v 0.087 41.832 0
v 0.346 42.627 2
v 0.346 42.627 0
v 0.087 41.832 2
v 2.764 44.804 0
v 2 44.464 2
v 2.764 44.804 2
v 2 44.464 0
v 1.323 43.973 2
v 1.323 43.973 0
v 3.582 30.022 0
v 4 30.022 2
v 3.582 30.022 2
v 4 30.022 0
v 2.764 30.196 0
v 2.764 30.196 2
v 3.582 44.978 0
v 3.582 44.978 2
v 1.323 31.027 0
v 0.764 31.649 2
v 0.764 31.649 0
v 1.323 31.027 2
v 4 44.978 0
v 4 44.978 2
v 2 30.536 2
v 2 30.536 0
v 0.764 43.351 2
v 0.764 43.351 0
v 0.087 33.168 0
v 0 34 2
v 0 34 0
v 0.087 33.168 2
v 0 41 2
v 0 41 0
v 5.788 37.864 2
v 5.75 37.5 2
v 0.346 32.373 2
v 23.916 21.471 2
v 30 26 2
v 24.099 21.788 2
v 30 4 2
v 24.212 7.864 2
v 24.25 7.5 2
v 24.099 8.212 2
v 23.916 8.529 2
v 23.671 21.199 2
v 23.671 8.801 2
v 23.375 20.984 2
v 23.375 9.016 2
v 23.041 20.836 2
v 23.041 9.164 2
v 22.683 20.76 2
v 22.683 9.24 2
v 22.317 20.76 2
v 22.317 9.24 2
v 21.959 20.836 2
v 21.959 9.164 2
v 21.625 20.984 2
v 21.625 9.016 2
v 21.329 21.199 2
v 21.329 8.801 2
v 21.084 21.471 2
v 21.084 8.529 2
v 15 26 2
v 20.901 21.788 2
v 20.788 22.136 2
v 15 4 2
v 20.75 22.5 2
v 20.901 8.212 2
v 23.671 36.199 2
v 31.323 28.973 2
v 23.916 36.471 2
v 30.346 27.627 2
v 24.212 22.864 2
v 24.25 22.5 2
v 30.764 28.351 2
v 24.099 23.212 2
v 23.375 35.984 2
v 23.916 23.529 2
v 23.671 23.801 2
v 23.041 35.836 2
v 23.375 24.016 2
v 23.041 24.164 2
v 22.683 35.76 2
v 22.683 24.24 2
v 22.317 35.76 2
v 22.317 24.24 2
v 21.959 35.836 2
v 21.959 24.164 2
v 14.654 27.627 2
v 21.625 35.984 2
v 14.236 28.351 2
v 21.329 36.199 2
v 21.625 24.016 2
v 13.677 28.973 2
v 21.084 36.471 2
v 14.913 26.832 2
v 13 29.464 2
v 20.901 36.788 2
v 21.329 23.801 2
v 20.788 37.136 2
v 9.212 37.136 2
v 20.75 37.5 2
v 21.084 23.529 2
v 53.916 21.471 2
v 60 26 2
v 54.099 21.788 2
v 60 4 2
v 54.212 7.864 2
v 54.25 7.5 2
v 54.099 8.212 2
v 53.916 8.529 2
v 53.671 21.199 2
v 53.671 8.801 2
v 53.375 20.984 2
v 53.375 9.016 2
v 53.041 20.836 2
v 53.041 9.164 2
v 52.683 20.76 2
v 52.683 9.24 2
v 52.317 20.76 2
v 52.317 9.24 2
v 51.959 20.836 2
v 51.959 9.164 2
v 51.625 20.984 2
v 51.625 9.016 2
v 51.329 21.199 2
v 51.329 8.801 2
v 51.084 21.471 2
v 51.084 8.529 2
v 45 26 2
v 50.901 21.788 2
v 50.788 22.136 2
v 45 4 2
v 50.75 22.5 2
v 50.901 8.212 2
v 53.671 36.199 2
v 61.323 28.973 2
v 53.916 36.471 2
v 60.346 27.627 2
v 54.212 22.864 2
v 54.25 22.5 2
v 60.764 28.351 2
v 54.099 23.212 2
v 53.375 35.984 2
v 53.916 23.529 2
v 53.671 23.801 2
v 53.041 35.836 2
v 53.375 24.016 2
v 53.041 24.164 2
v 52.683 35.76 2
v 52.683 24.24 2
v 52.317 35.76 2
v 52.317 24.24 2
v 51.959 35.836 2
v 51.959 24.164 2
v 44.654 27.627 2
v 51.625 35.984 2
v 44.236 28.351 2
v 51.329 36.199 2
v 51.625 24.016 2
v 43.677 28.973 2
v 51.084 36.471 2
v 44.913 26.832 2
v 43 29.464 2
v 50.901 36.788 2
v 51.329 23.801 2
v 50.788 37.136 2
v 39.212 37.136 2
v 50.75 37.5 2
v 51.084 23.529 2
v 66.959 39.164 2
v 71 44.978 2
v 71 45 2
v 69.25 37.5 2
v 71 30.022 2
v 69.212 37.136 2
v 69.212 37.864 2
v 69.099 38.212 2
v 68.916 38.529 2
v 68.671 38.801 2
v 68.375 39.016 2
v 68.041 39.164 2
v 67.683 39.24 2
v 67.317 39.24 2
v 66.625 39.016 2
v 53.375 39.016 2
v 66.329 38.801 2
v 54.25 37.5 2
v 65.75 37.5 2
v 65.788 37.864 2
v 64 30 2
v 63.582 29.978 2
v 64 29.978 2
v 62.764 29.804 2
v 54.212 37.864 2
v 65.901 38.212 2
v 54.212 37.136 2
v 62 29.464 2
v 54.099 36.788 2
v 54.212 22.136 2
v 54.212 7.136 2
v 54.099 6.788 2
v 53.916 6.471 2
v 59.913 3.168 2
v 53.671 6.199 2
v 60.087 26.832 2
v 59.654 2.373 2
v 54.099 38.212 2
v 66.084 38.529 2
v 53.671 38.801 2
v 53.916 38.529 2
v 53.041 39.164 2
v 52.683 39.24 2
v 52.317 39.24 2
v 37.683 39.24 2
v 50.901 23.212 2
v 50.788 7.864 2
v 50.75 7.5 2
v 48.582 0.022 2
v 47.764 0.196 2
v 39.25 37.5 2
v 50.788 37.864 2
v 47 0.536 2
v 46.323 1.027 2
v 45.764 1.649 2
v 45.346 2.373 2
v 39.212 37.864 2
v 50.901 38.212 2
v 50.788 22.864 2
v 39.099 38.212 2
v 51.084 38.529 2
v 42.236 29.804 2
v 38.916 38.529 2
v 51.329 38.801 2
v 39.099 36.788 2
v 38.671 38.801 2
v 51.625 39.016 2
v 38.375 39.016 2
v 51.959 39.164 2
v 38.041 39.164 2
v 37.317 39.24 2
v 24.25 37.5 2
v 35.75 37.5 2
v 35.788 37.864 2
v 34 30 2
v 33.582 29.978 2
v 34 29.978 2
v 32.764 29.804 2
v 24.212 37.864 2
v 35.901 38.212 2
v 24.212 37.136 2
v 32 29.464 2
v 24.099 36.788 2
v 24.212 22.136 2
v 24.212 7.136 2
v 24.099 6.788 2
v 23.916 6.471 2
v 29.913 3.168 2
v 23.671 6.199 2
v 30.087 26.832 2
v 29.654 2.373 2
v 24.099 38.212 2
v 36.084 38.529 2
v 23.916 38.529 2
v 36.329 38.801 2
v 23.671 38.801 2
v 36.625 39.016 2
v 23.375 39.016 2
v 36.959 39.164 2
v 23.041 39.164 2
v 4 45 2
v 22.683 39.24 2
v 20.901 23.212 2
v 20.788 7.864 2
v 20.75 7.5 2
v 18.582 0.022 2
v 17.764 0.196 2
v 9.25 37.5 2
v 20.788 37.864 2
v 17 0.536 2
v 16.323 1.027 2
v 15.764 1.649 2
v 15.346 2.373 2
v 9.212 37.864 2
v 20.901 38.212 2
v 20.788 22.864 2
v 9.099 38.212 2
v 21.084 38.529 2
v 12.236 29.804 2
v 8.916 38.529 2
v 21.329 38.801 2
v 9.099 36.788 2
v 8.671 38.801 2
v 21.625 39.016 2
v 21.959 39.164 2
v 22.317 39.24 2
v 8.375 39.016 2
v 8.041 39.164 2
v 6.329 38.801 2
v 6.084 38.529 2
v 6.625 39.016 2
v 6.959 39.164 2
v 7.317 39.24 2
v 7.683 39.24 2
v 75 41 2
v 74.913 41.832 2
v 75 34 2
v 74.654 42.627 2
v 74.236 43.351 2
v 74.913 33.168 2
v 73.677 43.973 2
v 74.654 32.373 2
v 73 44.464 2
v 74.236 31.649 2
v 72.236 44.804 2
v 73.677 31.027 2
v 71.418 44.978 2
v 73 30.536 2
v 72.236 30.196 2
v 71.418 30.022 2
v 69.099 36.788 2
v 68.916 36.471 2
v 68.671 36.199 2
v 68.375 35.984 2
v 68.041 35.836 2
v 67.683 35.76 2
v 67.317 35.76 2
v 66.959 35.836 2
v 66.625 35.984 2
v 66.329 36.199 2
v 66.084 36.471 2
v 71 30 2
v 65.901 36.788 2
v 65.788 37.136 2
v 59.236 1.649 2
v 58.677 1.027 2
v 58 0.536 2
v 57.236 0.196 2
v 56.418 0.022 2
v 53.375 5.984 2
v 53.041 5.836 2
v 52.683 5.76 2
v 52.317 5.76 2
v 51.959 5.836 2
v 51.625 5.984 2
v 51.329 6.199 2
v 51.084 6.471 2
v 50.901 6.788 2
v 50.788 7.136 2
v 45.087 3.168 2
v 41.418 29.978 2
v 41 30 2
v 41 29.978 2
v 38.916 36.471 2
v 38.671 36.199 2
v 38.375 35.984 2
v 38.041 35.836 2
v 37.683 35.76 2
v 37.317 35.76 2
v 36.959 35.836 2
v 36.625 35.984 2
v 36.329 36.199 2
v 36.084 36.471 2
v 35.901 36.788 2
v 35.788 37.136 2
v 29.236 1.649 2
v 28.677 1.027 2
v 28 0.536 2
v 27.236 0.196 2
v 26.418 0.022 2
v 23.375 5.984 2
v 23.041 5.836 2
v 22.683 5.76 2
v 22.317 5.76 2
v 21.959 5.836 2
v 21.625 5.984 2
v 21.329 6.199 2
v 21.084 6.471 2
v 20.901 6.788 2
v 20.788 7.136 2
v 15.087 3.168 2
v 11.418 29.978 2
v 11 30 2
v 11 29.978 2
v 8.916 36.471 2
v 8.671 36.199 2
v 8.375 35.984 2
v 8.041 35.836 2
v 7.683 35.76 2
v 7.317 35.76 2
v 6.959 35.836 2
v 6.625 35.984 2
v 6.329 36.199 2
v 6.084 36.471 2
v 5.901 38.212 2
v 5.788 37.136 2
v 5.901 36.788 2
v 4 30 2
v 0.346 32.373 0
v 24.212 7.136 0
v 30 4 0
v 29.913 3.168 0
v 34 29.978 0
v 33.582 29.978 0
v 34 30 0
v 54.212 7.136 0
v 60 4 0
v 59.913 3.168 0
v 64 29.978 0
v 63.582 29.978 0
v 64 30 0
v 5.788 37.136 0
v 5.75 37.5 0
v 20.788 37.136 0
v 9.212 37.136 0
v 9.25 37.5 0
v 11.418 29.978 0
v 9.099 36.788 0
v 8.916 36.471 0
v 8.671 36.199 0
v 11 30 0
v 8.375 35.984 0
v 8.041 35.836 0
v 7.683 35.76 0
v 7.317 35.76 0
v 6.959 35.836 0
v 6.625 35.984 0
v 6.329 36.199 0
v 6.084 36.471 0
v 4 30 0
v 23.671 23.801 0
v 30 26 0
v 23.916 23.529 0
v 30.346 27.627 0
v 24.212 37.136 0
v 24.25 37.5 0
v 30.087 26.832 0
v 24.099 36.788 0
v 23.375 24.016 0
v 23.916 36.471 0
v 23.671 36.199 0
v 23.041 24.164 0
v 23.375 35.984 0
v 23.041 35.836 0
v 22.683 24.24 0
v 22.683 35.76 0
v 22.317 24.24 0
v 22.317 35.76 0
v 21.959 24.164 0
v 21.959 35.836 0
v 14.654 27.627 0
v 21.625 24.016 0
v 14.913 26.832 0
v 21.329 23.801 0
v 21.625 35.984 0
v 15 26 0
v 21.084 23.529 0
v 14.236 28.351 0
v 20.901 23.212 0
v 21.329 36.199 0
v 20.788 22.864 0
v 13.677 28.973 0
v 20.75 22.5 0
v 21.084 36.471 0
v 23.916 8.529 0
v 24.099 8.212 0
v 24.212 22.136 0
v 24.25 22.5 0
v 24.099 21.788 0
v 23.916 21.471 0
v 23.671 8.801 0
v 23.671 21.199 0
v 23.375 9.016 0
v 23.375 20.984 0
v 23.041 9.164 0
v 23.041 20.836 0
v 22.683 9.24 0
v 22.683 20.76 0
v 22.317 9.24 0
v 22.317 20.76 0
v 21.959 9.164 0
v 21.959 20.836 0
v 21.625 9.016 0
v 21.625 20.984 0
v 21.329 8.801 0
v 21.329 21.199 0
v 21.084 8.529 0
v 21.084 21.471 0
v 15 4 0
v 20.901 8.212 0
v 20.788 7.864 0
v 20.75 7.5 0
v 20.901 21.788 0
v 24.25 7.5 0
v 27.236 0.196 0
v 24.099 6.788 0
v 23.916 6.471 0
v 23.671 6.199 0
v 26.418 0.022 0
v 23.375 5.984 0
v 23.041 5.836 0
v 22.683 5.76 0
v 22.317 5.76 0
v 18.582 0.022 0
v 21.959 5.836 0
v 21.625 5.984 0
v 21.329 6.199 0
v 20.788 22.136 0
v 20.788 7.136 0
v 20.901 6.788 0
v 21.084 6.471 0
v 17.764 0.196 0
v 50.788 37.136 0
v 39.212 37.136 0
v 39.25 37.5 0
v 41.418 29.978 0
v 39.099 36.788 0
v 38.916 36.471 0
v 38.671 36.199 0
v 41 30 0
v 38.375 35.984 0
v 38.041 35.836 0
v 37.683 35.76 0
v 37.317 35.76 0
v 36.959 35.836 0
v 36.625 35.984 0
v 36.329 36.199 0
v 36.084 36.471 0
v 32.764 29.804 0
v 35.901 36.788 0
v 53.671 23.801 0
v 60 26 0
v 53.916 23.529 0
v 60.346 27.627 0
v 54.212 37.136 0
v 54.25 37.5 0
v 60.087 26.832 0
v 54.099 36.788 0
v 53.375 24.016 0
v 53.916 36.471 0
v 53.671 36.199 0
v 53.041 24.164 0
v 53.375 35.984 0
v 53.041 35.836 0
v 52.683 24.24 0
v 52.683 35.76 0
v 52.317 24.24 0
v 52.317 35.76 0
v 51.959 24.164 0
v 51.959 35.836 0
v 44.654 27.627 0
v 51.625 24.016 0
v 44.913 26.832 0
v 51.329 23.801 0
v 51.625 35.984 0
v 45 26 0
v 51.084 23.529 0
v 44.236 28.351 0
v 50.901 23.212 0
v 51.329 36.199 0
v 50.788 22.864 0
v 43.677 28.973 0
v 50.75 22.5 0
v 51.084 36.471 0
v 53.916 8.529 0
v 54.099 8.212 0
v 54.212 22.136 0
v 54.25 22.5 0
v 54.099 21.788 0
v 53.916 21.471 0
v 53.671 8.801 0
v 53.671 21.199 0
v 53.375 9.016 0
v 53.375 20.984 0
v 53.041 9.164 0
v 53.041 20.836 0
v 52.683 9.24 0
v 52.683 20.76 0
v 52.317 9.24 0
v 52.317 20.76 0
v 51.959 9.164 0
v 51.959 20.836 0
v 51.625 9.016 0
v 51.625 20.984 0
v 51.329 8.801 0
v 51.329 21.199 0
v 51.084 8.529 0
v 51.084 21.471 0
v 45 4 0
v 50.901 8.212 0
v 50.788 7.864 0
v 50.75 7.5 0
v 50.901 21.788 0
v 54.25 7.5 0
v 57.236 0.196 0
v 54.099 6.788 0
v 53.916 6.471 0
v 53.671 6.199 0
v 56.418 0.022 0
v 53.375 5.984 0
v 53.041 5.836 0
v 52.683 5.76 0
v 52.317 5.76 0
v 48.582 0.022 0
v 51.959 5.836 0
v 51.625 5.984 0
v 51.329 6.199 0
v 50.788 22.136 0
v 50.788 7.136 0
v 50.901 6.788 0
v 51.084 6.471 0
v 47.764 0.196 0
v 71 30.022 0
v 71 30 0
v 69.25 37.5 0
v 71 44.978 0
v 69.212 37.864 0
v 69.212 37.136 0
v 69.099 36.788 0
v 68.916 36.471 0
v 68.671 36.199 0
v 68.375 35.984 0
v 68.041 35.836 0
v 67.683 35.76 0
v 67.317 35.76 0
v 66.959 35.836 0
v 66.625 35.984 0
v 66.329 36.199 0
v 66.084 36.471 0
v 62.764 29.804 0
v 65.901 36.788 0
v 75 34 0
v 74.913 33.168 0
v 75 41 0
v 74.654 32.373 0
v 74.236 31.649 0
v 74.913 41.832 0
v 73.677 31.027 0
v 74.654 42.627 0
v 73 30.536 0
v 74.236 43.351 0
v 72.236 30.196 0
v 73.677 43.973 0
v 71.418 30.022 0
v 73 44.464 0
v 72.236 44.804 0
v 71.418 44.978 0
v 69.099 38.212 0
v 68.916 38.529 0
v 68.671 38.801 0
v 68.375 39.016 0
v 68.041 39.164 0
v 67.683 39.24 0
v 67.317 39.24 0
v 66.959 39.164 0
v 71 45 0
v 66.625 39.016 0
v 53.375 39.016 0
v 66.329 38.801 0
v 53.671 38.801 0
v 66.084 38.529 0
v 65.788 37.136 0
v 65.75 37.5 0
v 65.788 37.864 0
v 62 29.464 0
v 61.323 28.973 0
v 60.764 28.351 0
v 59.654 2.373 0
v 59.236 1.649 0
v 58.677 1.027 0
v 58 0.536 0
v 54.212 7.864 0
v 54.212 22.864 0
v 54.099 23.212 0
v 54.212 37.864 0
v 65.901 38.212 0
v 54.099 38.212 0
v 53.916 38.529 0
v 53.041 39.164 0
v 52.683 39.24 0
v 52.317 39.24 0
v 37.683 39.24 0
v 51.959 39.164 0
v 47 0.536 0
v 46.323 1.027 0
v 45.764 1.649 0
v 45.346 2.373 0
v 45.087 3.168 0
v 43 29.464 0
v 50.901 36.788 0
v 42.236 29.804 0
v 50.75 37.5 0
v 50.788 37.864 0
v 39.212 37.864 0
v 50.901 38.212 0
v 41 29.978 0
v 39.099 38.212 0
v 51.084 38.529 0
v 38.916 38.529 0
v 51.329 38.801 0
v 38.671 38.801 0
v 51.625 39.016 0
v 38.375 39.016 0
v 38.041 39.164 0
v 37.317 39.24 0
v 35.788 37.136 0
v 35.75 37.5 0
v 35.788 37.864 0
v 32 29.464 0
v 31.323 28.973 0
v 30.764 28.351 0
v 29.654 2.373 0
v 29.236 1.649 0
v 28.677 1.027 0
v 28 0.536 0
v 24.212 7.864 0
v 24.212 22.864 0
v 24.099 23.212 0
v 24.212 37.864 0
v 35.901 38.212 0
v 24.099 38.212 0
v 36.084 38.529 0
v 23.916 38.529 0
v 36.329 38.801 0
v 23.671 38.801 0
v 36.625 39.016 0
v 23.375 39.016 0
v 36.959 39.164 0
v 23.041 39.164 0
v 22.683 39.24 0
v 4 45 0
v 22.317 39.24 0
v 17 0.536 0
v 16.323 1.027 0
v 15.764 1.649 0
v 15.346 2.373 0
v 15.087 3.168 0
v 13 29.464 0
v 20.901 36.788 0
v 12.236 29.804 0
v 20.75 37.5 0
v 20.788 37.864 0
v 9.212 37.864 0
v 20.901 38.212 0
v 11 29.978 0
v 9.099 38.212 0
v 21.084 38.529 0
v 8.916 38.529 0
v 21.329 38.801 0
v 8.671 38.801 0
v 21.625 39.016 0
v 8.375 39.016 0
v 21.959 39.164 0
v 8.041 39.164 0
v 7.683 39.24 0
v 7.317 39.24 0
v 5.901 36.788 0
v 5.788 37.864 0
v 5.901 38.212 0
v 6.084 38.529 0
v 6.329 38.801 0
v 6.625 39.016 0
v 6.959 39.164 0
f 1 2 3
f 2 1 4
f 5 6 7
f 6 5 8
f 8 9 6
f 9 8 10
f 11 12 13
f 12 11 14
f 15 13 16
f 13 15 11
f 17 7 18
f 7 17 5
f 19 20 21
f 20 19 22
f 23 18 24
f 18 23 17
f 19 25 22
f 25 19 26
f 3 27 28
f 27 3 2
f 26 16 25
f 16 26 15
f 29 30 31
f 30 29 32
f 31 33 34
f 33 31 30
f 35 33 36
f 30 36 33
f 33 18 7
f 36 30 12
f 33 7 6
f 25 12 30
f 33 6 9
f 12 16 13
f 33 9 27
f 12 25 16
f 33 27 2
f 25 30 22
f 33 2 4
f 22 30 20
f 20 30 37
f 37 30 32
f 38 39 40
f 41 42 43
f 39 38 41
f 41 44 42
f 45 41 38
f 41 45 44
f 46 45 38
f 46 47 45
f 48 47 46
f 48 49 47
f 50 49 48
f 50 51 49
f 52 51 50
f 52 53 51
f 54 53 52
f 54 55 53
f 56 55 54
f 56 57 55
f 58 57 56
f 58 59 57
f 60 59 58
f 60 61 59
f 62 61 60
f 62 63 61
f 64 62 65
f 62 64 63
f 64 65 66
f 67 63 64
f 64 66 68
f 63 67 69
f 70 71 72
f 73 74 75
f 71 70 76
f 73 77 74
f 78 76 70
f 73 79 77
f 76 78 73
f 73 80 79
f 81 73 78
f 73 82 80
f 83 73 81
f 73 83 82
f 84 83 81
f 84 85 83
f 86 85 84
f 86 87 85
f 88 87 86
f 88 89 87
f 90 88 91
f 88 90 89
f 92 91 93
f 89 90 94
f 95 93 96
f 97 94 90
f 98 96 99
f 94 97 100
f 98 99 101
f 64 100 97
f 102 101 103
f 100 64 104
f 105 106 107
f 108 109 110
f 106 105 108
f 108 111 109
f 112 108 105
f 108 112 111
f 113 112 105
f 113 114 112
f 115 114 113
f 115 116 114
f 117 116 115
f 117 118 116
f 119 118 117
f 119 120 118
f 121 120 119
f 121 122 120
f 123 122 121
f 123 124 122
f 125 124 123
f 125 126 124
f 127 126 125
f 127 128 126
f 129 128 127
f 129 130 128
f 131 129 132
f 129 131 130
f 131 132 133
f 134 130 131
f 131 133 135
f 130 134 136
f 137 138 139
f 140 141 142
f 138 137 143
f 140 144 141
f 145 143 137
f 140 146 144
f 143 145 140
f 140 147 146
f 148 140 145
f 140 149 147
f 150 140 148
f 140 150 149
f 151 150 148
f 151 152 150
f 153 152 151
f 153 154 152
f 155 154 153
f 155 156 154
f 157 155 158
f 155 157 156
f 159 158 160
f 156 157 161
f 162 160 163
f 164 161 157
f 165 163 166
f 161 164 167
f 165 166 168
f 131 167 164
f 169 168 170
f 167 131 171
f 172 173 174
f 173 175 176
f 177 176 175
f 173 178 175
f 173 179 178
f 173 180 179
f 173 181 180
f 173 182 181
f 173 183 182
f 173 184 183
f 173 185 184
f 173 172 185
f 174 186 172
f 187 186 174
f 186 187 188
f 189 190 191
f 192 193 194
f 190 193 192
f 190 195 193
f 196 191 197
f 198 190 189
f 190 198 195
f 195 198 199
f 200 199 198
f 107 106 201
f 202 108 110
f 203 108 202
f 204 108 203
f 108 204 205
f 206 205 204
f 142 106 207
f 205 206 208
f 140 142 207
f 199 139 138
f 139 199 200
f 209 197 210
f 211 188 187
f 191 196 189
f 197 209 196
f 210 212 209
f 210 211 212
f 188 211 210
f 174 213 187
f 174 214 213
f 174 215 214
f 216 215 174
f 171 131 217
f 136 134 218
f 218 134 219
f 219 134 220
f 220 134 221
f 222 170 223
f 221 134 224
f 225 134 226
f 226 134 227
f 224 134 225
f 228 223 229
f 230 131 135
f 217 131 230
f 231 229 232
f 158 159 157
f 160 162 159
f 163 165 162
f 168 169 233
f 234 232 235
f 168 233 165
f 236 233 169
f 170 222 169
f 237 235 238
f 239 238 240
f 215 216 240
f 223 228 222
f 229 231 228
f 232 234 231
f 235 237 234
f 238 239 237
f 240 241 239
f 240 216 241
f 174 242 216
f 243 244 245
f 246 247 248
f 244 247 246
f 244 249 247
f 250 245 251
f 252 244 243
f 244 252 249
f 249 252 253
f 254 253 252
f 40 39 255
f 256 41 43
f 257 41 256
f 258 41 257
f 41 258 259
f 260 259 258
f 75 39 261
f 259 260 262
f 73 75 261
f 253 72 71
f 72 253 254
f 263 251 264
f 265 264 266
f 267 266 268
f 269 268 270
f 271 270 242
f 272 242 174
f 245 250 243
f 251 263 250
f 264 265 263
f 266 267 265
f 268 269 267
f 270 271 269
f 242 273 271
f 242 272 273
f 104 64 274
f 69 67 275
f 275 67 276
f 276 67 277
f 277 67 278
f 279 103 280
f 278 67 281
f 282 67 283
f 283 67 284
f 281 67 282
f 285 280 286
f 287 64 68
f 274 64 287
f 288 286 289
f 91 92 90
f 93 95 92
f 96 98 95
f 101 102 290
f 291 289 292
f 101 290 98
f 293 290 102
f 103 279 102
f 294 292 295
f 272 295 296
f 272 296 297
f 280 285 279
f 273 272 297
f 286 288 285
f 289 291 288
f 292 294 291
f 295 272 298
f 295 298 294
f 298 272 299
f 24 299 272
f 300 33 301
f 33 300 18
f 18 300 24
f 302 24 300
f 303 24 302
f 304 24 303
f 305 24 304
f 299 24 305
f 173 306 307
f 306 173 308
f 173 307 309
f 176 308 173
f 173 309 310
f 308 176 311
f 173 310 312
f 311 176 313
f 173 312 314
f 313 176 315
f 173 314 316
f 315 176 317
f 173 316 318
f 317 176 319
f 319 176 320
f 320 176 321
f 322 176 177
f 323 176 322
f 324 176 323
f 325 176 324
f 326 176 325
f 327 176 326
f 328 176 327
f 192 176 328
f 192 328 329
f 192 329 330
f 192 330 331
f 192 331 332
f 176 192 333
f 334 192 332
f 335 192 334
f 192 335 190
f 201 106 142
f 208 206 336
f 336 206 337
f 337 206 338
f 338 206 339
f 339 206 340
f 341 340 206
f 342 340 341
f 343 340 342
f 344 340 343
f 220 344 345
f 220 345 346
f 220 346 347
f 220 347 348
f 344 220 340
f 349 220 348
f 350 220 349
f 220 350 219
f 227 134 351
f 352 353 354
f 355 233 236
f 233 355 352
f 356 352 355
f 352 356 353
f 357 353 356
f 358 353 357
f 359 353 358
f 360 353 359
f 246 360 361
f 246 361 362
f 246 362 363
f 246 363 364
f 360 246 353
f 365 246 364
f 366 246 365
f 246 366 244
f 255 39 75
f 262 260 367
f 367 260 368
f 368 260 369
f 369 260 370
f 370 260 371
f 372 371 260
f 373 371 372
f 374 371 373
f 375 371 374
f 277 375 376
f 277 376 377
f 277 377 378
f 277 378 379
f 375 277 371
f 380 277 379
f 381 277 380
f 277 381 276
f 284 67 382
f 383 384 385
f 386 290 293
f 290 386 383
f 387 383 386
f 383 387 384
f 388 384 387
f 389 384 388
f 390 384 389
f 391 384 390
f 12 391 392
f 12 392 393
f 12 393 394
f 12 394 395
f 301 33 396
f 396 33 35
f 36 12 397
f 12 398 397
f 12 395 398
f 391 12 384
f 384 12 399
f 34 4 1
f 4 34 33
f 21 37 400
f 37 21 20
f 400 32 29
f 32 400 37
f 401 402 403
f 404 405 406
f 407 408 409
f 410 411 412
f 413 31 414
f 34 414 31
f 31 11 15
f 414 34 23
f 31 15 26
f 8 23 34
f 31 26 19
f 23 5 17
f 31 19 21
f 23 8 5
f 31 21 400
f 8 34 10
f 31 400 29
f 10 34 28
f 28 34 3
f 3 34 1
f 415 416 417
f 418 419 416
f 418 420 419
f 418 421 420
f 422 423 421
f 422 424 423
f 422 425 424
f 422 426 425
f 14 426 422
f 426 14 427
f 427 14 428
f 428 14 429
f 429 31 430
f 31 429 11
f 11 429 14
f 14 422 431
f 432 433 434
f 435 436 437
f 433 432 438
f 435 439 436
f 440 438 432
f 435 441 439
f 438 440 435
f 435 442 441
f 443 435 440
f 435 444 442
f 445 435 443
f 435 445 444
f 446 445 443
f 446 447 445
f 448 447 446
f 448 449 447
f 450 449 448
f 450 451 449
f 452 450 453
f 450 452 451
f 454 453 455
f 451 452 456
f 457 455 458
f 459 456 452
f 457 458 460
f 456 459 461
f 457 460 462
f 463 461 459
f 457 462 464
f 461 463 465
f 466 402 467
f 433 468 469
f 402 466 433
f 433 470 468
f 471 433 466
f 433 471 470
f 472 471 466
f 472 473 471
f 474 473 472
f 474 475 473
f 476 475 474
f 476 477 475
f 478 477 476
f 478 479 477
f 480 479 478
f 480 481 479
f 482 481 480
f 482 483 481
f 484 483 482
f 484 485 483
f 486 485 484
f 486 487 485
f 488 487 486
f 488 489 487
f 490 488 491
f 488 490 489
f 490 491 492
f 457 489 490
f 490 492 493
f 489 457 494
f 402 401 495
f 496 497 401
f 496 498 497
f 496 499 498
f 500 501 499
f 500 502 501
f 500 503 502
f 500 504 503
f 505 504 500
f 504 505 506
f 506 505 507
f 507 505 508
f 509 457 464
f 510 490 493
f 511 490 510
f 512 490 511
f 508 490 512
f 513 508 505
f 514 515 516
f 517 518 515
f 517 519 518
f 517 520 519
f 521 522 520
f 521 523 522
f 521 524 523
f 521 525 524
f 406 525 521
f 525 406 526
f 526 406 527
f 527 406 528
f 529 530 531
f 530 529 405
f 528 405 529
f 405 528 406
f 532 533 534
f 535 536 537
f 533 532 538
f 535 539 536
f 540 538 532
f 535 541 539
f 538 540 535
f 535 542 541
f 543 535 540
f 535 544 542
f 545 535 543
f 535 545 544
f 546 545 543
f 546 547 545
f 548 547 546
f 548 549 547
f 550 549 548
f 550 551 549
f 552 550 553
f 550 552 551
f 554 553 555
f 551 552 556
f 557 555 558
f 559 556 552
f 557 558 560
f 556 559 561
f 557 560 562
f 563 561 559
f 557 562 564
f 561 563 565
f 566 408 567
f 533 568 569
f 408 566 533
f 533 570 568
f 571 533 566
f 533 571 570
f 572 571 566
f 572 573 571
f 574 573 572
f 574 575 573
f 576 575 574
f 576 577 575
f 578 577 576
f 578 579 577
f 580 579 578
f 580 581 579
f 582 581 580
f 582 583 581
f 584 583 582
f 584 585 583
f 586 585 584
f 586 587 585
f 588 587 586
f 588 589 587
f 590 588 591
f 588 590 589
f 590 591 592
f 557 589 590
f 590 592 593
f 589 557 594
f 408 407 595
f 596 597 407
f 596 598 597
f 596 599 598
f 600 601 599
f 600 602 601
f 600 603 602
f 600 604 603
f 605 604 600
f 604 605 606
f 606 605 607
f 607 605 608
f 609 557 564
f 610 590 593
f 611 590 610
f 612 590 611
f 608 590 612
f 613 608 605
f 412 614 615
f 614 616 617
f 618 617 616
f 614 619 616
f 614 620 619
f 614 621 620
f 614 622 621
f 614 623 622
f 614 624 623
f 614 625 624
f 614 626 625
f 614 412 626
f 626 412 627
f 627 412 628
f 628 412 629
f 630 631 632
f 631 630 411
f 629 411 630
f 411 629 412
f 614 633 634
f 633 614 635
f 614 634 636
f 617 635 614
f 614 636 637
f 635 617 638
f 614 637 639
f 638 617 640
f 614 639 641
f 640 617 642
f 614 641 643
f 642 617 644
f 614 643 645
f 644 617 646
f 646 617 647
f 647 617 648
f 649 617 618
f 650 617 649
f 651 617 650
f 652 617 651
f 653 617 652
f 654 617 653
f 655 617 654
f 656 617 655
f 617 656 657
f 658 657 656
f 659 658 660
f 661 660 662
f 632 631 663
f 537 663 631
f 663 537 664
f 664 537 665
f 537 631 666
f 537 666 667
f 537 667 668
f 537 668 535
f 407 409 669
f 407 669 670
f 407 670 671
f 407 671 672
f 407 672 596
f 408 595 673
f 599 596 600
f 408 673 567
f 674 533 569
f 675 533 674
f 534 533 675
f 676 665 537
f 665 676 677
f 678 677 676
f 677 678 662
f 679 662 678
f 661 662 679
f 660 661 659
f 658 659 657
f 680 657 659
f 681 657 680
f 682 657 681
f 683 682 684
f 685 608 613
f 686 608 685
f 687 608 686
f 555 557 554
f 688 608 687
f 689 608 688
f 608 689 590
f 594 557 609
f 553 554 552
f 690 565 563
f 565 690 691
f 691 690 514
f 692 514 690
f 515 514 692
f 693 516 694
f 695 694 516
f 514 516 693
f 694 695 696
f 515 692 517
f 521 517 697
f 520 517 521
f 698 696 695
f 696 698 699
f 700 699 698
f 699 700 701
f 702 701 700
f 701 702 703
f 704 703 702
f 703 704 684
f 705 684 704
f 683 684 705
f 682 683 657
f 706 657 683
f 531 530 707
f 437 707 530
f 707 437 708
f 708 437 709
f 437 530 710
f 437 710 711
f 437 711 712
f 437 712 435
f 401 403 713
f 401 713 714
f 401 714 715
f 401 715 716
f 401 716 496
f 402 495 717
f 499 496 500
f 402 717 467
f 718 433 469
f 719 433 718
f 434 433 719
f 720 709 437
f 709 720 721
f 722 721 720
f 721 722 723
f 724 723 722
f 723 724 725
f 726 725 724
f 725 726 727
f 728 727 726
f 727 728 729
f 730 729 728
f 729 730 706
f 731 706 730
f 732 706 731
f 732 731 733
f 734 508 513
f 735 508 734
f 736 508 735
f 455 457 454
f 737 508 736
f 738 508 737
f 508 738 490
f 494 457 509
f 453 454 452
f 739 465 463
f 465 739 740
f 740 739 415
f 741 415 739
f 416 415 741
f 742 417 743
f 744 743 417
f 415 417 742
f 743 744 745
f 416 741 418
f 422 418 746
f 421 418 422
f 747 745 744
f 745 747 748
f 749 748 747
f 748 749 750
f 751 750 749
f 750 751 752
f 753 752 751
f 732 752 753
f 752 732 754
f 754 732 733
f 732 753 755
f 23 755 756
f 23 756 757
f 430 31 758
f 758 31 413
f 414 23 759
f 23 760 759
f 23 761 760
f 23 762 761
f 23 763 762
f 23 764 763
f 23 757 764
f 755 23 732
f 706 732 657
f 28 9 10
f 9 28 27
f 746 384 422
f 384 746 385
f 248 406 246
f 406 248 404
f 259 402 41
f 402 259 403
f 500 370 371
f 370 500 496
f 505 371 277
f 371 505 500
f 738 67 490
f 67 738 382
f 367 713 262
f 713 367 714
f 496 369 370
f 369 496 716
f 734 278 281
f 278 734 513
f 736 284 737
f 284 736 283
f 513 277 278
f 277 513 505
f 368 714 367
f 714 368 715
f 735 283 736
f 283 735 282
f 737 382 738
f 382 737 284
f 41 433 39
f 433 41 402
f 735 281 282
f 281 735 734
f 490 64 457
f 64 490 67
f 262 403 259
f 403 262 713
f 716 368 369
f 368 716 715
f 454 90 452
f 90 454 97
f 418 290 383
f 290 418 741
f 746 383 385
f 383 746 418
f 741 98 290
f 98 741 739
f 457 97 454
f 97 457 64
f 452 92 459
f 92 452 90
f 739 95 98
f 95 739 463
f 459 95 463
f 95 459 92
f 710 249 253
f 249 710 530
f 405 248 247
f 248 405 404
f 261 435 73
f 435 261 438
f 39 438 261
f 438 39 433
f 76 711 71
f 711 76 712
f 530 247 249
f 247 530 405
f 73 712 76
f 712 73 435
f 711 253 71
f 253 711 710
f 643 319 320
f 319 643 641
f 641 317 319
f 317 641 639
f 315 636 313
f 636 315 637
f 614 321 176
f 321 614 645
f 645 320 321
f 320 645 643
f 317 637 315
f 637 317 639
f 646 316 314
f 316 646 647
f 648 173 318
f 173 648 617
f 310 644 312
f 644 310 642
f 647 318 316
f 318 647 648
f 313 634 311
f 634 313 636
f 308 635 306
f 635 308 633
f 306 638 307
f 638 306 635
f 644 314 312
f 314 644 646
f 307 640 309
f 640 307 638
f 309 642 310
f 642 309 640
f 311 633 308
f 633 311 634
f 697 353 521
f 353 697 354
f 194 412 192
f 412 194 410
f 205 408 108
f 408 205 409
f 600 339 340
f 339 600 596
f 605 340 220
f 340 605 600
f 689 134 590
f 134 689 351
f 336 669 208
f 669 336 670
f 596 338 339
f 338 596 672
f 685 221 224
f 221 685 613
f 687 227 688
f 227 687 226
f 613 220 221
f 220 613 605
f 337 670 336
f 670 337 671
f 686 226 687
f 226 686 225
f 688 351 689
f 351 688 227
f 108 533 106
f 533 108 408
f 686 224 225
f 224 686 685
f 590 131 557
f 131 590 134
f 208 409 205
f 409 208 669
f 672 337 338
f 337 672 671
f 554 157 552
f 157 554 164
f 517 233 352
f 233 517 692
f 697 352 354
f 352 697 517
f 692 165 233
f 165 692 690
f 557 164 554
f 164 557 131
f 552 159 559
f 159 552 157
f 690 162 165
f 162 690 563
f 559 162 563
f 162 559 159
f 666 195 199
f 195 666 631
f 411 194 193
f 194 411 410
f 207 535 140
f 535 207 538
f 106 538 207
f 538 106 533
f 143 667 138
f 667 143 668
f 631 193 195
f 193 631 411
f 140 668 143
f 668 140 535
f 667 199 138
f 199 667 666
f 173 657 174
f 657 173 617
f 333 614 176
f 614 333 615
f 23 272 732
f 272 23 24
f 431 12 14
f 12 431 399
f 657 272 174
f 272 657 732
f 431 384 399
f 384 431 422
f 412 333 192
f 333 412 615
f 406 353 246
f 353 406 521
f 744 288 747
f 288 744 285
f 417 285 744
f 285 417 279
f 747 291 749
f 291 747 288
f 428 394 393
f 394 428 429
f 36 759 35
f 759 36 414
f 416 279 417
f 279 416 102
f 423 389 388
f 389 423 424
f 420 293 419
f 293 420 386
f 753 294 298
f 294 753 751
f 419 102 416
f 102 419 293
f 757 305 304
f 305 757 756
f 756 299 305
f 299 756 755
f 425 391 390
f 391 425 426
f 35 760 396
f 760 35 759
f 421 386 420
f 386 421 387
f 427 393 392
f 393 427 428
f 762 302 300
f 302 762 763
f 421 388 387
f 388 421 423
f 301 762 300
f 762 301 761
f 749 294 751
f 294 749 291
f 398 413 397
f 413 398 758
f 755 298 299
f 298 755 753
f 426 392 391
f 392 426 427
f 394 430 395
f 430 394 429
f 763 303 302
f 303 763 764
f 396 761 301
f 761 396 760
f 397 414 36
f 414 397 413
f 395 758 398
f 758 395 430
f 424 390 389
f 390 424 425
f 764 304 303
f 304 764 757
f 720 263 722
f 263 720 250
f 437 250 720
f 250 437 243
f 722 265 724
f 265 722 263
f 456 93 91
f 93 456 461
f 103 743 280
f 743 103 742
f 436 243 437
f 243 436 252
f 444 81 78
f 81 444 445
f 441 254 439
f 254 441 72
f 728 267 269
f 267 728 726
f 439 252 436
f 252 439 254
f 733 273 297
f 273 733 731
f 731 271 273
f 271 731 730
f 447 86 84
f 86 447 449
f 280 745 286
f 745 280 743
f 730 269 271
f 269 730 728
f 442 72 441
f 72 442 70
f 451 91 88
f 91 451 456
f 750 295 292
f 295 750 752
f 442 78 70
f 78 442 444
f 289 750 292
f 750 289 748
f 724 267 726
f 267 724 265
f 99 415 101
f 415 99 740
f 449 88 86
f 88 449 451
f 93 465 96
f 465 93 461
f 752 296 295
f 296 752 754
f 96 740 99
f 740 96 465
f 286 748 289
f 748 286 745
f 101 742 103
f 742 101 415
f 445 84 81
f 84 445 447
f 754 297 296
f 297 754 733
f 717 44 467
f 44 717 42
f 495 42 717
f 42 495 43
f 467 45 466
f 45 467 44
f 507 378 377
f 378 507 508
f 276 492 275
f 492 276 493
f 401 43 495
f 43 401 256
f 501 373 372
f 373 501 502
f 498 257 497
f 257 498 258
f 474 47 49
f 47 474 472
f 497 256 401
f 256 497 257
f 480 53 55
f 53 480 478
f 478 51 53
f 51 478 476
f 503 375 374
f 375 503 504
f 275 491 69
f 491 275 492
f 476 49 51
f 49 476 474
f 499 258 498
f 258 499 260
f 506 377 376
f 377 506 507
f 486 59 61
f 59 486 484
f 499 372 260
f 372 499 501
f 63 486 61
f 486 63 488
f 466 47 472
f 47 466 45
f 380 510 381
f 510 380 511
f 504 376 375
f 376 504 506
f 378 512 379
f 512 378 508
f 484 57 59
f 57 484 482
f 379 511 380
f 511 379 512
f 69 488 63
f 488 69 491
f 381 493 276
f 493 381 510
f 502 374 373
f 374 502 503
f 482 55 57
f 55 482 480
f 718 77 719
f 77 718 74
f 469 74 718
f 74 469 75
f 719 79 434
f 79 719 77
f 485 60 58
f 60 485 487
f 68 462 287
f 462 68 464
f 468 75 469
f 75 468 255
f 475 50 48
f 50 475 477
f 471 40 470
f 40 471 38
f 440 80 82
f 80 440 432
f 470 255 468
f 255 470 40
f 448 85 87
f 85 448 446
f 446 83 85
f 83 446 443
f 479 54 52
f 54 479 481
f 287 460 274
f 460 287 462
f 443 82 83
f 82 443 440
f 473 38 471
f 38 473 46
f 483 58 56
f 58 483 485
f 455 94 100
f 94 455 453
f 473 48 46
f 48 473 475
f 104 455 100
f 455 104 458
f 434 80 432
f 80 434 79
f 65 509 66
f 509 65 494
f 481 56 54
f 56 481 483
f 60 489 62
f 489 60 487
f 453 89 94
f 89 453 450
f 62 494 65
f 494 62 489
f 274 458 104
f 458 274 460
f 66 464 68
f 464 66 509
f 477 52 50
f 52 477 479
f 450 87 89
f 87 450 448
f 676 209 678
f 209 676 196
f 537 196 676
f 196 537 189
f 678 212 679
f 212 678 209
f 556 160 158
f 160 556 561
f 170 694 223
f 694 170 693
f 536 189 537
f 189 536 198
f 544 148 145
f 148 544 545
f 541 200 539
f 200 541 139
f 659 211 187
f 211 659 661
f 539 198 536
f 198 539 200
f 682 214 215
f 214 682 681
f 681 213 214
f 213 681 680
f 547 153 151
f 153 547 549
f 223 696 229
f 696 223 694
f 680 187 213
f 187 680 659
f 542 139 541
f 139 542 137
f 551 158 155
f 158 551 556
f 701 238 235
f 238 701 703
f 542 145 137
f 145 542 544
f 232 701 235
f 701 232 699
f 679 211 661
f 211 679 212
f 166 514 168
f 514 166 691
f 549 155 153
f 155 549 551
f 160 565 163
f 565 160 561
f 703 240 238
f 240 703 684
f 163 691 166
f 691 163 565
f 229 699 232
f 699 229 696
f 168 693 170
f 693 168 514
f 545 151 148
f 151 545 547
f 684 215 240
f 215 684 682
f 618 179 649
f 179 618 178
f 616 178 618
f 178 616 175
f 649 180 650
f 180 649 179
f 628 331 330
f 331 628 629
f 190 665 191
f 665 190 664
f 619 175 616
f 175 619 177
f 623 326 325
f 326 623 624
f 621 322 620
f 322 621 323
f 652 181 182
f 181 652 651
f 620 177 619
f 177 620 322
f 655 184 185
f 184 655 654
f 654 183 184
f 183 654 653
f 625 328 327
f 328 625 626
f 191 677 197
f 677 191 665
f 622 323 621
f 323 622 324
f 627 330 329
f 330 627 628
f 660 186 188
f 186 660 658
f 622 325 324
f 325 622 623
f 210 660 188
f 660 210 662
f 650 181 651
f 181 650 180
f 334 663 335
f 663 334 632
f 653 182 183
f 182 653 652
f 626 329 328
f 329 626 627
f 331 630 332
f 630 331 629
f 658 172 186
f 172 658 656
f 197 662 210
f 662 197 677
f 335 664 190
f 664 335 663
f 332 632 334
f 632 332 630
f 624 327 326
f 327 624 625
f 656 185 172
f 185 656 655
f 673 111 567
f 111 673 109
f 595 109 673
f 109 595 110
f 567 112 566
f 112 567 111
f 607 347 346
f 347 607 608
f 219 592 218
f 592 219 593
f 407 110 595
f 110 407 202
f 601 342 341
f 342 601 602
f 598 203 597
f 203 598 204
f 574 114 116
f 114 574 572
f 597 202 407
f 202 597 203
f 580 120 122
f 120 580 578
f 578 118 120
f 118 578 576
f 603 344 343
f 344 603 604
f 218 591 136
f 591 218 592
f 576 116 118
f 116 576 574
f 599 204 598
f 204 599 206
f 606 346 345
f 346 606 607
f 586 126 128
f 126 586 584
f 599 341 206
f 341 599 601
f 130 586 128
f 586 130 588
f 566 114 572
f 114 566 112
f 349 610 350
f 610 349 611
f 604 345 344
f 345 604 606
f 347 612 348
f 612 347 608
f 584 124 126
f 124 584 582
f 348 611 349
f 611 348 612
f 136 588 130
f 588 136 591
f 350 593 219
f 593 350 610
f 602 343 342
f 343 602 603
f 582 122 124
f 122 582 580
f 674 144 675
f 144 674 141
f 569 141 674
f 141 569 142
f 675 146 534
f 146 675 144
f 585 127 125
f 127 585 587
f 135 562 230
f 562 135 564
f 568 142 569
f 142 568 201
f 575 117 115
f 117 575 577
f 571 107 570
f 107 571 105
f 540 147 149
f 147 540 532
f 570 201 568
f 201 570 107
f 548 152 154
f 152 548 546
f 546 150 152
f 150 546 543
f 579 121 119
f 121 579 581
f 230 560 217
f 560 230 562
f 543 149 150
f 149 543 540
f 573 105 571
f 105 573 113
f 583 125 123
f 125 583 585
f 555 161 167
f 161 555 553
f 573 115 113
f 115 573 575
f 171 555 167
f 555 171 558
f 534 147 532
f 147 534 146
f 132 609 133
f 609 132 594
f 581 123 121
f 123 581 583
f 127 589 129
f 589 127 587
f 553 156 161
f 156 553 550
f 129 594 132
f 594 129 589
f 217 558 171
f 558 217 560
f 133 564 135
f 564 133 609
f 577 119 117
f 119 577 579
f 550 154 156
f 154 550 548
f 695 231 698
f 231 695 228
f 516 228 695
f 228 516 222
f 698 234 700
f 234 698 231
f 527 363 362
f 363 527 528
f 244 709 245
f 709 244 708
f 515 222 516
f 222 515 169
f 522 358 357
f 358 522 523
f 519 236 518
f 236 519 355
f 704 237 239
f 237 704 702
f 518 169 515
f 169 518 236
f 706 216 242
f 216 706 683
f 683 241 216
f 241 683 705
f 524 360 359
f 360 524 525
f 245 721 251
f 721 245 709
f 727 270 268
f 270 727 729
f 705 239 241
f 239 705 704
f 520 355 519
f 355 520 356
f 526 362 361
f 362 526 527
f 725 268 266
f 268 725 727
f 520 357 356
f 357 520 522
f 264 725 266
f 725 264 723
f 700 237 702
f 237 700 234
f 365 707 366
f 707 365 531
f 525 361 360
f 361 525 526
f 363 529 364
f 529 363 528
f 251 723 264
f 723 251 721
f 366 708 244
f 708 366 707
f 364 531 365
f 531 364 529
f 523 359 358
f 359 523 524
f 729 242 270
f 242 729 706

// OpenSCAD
//spacing between T centers
spacing = 30;
//15mm for misumi and Openbeam
ext_size = 15; 
//thickness of piece
thickness = 2;

m3_hole = 3.5;
corner_radius = 4;

difference() {
  union() {
    difference() {
      union() {
        T();
        translate([spacing,0,0]) T();
        translate([corner_radius,ext_size*2])
        cube([ext_size*3+spacing-corner_radius*2,ext_size,thickness]);
      }
      T_holes();
      translate([spacing,0,0]) T_holes();
    }
    translate([spacing/2+ext_size*1.5,ext_size*2.5,thickness/2])
    if(spacing<37) {
      cylinder(d=ext_size-m3_hole,h=thickness,center=true);
    }
  }
  translate([spacing/2+ext_size*1.5,ext_size*2.5,thickness/2])
  cylinder(d=m3_hole,h=3*thickness,center=true,$fn=30);
}

module T_holes(){
  for (ii = [ext_size/2:ext_size:3*ext_size]) {
    translate([ii,2.5*ext_size ,0 ])
    cylinder(d=m3_hole,h=thickness*3,center=true,$fn=30);
  }
  for (ii = [ext_size/2:ext_size:3*ext_size]) {
    translate([1.5*ext_size,ii ,0 ])
    cylinder(d=m3_hole,h=thickness*3,center=true,$fn=30);
  }
}
module T() {
  difference() {
    union() {
      translate([0,2*ext_size] )
      v_rounded_cube([3*ext_size,ext_size,thickness],corner_radius);
      translate([(ext_size - corner_radius),corner_radius,0])
      v_rounded_cube([ext_size+corner_radius*2,ext_size*3-corner_radius,thickness],corner_radius);
      translate([(ext_size ),0,0])
      v_rounded_cube([ext_size,ext_size*3,thickness],corner_radius);
    }

    translate([-corner_radius,-corner_radius ])
    v_rounded_cube([ext_size+corner_radius,ext_size*2+corner_radius,thickness],corner_radius);
    translate([2*ext_size,-corner_radius ])
    v_rounded_cube([ext_size+corner_radius,ext_size*2+corner_radius,thickness],corner_radius);
  }
}


module v_rounded_cube(xyz,r,$fn=30) {
  z = xyz[2];
  y = xyz[1];
  x = xyz[0];
  translate([r,r])
  hull() {
    cylinder(h=z,r=r);
    translate([0,y-2*r])
    cylinder(h=z,r=r);
    translate([x-2*r,0])
    cylinder(h=z,r=r);
    translate([x-2*r,y-2*r])
    cylinder(h=z,r=r);
  }
}
